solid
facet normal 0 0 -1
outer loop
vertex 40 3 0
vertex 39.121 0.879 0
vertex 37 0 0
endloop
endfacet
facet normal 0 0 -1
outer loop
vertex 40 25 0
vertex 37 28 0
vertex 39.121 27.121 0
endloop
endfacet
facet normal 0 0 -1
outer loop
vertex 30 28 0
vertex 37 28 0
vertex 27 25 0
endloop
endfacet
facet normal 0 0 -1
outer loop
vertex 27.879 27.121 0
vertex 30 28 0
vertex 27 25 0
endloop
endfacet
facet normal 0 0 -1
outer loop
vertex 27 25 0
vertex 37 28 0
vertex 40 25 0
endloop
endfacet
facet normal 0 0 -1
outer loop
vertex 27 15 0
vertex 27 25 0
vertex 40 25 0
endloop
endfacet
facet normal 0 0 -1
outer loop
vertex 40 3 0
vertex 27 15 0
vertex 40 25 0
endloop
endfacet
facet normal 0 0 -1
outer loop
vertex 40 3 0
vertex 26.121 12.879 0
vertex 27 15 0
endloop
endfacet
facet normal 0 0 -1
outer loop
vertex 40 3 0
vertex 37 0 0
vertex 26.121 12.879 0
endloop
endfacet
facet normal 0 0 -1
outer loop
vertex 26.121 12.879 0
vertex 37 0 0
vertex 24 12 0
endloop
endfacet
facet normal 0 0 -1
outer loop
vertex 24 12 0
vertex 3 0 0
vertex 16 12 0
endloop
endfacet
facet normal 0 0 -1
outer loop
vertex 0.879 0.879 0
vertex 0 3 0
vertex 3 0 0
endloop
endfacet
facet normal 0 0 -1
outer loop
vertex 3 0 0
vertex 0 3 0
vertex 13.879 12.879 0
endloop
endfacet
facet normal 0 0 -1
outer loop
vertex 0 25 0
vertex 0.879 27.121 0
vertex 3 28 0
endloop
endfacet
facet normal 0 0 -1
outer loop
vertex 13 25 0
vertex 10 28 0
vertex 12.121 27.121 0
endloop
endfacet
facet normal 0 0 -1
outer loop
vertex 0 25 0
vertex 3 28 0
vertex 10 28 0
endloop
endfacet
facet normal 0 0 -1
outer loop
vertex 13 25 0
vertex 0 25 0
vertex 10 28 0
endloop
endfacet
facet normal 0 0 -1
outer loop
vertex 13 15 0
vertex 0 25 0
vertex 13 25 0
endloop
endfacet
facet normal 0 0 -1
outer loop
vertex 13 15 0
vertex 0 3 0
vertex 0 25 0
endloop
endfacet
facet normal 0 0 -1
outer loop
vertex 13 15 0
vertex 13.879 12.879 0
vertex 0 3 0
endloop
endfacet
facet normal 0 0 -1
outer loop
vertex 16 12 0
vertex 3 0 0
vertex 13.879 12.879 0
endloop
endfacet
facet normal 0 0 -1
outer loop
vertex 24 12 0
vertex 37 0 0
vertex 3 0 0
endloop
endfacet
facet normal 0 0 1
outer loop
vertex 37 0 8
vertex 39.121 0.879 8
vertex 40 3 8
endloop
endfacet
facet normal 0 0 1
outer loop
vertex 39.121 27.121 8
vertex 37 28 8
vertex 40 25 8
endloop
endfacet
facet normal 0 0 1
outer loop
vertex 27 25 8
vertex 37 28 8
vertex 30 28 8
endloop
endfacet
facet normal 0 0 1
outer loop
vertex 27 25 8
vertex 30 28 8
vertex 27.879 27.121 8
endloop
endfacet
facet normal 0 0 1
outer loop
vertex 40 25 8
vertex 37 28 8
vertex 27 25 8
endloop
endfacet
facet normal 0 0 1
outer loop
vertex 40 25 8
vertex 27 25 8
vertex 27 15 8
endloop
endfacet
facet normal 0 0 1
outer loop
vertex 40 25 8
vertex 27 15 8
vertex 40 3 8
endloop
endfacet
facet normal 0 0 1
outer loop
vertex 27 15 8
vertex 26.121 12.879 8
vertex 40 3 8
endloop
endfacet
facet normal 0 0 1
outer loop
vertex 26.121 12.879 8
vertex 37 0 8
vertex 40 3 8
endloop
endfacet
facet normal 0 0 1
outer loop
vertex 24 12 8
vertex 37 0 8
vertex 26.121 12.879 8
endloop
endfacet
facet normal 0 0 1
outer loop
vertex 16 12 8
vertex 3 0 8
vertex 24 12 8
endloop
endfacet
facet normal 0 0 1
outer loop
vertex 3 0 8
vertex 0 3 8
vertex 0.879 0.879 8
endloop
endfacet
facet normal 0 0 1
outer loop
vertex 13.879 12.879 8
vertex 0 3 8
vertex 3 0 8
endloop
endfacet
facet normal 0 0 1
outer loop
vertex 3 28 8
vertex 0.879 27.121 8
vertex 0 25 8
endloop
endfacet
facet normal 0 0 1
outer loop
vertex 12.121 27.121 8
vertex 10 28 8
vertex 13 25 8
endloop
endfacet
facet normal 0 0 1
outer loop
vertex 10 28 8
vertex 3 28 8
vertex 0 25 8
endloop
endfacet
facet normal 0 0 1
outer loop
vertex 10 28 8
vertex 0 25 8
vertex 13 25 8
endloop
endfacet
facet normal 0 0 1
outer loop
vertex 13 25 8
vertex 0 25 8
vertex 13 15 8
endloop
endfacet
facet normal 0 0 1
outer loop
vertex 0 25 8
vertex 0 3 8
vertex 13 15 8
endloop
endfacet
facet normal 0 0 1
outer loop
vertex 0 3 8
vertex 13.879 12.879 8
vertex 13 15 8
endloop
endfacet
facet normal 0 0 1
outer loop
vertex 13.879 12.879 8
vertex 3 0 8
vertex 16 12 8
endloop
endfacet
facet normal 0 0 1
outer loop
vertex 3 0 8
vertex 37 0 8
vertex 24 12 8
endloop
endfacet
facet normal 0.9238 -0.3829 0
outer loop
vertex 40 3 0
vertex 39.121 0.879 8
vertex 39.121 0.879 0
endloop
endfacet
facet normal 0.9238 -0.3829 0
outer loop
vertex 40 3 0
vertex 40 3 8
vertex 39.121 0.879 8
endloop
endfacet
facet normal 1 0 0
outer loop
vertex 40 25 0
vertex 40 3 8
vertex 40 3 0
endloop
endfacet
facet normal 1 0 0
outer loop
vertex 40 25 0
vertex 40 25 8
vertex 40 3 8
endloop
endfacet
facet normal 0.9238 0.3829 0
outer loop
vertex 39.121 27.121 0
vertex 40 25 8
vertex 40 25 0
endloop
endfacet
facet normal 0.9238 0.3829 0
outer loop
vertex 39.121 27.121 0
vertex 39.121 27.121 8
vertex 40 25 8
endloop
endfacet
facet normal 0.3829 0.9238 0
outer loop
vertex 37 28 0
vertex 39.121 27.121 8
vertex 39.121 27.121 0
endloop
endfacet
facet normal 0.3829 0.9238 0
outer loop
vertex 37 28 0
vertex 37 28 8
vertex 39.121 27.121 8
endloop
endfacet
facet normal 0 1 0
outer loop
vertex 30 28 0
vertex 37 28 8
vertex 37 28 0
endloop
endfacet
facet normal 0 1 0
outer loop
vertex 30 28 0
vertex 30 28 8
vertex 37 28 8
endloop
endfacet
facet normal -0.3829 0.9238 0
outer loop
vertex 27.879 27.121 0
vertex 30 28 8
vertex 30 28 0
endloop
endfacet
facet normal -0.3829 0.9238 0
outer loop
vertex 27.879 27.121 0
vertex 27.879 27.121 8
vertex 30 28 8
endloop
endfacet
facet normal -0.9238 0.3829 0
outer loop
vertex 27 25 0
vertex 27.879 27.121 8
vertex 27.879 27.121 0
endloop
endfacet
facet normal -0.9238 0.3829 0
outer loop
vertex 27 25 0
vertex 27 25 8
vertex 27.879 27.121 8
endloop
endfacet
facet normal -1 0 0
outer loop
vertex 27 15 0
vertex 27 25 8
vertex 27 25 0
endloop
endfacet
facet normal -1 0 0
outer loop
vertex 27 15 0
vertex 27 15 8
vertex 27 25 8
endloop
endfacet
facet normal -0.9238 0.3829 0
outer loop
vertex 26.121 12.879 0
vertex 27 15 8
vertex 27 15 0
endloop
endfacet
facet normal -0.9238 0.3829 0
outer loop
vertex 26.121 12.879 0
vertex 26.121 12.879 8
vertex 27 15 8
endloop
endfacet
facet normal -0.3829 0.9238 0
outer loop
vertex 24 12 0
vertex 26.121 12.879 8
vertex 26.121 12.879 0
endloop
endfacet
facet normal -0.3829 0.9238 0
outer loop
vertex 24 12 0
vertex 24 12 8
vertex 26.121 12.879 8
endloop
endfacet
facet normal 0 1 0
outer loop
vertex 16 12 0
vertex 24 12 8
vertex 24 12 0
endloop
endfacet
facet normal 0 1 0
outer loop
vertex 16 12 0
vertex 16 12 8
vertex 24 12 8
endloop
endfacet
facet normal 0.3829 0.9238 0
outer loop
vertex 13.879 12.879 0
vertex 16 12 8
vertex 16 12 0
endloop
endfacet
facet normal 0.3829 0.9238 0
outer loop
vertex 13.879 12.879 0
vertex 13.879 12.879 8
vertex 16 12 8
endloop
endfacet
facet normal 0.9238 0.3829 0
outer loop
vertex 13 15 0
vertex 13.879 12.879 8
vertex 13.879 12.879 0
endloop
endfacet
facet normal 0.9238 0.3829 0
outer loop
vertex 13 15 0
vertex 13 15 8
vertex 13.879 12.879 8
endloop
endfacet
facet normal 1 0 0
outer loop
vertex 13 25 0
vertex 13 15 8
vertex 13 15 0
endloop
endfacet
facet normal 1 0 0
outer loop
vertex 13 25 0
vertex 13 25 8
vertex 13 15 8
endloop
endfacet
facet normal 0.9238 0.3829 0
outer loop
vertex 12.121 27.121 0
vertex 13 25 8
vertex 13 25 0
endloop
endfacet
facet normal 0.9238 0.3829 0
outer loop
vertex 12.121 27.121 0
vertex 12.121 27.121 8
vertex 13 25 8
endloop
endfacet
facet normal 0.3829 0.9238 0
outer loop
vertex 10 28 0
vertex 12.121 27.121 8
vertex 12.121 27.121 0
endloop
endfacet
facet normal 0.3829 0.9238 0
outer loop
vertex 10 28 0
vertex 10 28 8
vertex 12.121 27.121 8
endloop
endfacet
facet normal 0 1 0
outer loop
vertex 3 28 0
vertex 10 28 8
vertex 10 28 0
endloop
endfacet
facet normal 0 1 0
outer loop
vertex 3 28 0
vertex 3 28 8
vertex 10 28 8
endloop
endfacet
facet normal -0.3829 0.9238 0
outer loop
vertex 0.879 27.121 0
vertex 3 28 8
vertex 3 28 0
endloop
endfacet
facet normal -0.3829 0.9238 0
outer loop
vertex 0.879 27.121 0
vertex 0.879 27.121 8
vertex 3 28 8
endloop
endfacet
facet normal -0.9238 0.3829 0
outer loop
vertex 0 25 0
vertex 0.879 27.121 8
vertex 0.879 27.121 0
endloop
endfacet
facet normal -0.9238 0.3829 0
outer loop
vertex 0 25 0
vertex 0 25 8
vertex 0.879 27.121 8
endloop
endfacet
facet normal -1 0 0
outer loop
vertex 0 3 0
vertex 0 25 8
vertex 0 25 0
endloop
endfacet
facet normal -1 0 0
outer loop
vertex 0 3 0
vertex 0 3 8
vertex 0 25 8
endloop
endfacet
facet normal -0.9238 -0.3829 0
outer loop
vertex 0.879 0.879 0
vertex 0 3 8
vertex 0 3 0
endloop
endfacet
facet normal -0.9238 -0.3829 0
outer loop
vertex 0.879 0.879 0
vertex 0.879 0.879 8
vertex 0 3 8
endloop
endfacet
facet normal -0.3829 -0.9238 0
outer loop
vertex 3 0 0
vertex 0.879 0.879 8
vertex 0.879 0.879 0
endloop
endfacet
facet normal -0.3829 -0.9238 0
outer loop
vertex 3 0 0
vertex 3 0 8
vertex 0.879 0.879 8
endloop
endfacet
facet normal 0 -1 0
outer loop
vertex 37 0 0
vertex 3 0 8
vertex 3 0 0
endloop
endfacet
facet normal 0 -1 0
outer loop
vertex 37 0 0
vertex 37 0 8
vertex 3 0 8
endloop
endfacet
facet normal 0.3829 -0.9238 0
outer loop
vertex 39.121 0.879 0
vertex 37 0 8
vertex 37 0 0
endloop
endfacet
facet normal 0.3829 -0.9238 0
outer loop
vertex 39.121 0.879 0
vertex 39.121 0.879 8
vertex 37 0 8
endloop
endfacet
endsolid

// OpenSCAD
$fn = 32;

// ----------------------------------------------------------------------
// Eye lug: clevis, 8 mm thick
// ----------------------------------------------------------------------

// --- parameters (mm) ---
profile_height = 8;       // extrusion height
profile_points = 24;      // points of the closed outline

profile = [[0, 3], [0.879, 0.879], [3, 0], [37, 0], [39.121, 0.879], [40, 3], [40, 25], [39.121, 27.121], [37, 28], [30, 28], [27.879, 27.121], [27, 25], [27, 15], [26.121, 12.879], [24, 12], [16, 12], [13.879, 12.879], [13, 15], [13, 25], [12.121, 27.121], [10, 28], [3, 28], [0.879, 27.121], [0, 25]];  // single closed polygon, 24 points, counter clockwise

// --- the one profile operation ---
linear_extrude(height = profile_height) polygon(points = profile);
